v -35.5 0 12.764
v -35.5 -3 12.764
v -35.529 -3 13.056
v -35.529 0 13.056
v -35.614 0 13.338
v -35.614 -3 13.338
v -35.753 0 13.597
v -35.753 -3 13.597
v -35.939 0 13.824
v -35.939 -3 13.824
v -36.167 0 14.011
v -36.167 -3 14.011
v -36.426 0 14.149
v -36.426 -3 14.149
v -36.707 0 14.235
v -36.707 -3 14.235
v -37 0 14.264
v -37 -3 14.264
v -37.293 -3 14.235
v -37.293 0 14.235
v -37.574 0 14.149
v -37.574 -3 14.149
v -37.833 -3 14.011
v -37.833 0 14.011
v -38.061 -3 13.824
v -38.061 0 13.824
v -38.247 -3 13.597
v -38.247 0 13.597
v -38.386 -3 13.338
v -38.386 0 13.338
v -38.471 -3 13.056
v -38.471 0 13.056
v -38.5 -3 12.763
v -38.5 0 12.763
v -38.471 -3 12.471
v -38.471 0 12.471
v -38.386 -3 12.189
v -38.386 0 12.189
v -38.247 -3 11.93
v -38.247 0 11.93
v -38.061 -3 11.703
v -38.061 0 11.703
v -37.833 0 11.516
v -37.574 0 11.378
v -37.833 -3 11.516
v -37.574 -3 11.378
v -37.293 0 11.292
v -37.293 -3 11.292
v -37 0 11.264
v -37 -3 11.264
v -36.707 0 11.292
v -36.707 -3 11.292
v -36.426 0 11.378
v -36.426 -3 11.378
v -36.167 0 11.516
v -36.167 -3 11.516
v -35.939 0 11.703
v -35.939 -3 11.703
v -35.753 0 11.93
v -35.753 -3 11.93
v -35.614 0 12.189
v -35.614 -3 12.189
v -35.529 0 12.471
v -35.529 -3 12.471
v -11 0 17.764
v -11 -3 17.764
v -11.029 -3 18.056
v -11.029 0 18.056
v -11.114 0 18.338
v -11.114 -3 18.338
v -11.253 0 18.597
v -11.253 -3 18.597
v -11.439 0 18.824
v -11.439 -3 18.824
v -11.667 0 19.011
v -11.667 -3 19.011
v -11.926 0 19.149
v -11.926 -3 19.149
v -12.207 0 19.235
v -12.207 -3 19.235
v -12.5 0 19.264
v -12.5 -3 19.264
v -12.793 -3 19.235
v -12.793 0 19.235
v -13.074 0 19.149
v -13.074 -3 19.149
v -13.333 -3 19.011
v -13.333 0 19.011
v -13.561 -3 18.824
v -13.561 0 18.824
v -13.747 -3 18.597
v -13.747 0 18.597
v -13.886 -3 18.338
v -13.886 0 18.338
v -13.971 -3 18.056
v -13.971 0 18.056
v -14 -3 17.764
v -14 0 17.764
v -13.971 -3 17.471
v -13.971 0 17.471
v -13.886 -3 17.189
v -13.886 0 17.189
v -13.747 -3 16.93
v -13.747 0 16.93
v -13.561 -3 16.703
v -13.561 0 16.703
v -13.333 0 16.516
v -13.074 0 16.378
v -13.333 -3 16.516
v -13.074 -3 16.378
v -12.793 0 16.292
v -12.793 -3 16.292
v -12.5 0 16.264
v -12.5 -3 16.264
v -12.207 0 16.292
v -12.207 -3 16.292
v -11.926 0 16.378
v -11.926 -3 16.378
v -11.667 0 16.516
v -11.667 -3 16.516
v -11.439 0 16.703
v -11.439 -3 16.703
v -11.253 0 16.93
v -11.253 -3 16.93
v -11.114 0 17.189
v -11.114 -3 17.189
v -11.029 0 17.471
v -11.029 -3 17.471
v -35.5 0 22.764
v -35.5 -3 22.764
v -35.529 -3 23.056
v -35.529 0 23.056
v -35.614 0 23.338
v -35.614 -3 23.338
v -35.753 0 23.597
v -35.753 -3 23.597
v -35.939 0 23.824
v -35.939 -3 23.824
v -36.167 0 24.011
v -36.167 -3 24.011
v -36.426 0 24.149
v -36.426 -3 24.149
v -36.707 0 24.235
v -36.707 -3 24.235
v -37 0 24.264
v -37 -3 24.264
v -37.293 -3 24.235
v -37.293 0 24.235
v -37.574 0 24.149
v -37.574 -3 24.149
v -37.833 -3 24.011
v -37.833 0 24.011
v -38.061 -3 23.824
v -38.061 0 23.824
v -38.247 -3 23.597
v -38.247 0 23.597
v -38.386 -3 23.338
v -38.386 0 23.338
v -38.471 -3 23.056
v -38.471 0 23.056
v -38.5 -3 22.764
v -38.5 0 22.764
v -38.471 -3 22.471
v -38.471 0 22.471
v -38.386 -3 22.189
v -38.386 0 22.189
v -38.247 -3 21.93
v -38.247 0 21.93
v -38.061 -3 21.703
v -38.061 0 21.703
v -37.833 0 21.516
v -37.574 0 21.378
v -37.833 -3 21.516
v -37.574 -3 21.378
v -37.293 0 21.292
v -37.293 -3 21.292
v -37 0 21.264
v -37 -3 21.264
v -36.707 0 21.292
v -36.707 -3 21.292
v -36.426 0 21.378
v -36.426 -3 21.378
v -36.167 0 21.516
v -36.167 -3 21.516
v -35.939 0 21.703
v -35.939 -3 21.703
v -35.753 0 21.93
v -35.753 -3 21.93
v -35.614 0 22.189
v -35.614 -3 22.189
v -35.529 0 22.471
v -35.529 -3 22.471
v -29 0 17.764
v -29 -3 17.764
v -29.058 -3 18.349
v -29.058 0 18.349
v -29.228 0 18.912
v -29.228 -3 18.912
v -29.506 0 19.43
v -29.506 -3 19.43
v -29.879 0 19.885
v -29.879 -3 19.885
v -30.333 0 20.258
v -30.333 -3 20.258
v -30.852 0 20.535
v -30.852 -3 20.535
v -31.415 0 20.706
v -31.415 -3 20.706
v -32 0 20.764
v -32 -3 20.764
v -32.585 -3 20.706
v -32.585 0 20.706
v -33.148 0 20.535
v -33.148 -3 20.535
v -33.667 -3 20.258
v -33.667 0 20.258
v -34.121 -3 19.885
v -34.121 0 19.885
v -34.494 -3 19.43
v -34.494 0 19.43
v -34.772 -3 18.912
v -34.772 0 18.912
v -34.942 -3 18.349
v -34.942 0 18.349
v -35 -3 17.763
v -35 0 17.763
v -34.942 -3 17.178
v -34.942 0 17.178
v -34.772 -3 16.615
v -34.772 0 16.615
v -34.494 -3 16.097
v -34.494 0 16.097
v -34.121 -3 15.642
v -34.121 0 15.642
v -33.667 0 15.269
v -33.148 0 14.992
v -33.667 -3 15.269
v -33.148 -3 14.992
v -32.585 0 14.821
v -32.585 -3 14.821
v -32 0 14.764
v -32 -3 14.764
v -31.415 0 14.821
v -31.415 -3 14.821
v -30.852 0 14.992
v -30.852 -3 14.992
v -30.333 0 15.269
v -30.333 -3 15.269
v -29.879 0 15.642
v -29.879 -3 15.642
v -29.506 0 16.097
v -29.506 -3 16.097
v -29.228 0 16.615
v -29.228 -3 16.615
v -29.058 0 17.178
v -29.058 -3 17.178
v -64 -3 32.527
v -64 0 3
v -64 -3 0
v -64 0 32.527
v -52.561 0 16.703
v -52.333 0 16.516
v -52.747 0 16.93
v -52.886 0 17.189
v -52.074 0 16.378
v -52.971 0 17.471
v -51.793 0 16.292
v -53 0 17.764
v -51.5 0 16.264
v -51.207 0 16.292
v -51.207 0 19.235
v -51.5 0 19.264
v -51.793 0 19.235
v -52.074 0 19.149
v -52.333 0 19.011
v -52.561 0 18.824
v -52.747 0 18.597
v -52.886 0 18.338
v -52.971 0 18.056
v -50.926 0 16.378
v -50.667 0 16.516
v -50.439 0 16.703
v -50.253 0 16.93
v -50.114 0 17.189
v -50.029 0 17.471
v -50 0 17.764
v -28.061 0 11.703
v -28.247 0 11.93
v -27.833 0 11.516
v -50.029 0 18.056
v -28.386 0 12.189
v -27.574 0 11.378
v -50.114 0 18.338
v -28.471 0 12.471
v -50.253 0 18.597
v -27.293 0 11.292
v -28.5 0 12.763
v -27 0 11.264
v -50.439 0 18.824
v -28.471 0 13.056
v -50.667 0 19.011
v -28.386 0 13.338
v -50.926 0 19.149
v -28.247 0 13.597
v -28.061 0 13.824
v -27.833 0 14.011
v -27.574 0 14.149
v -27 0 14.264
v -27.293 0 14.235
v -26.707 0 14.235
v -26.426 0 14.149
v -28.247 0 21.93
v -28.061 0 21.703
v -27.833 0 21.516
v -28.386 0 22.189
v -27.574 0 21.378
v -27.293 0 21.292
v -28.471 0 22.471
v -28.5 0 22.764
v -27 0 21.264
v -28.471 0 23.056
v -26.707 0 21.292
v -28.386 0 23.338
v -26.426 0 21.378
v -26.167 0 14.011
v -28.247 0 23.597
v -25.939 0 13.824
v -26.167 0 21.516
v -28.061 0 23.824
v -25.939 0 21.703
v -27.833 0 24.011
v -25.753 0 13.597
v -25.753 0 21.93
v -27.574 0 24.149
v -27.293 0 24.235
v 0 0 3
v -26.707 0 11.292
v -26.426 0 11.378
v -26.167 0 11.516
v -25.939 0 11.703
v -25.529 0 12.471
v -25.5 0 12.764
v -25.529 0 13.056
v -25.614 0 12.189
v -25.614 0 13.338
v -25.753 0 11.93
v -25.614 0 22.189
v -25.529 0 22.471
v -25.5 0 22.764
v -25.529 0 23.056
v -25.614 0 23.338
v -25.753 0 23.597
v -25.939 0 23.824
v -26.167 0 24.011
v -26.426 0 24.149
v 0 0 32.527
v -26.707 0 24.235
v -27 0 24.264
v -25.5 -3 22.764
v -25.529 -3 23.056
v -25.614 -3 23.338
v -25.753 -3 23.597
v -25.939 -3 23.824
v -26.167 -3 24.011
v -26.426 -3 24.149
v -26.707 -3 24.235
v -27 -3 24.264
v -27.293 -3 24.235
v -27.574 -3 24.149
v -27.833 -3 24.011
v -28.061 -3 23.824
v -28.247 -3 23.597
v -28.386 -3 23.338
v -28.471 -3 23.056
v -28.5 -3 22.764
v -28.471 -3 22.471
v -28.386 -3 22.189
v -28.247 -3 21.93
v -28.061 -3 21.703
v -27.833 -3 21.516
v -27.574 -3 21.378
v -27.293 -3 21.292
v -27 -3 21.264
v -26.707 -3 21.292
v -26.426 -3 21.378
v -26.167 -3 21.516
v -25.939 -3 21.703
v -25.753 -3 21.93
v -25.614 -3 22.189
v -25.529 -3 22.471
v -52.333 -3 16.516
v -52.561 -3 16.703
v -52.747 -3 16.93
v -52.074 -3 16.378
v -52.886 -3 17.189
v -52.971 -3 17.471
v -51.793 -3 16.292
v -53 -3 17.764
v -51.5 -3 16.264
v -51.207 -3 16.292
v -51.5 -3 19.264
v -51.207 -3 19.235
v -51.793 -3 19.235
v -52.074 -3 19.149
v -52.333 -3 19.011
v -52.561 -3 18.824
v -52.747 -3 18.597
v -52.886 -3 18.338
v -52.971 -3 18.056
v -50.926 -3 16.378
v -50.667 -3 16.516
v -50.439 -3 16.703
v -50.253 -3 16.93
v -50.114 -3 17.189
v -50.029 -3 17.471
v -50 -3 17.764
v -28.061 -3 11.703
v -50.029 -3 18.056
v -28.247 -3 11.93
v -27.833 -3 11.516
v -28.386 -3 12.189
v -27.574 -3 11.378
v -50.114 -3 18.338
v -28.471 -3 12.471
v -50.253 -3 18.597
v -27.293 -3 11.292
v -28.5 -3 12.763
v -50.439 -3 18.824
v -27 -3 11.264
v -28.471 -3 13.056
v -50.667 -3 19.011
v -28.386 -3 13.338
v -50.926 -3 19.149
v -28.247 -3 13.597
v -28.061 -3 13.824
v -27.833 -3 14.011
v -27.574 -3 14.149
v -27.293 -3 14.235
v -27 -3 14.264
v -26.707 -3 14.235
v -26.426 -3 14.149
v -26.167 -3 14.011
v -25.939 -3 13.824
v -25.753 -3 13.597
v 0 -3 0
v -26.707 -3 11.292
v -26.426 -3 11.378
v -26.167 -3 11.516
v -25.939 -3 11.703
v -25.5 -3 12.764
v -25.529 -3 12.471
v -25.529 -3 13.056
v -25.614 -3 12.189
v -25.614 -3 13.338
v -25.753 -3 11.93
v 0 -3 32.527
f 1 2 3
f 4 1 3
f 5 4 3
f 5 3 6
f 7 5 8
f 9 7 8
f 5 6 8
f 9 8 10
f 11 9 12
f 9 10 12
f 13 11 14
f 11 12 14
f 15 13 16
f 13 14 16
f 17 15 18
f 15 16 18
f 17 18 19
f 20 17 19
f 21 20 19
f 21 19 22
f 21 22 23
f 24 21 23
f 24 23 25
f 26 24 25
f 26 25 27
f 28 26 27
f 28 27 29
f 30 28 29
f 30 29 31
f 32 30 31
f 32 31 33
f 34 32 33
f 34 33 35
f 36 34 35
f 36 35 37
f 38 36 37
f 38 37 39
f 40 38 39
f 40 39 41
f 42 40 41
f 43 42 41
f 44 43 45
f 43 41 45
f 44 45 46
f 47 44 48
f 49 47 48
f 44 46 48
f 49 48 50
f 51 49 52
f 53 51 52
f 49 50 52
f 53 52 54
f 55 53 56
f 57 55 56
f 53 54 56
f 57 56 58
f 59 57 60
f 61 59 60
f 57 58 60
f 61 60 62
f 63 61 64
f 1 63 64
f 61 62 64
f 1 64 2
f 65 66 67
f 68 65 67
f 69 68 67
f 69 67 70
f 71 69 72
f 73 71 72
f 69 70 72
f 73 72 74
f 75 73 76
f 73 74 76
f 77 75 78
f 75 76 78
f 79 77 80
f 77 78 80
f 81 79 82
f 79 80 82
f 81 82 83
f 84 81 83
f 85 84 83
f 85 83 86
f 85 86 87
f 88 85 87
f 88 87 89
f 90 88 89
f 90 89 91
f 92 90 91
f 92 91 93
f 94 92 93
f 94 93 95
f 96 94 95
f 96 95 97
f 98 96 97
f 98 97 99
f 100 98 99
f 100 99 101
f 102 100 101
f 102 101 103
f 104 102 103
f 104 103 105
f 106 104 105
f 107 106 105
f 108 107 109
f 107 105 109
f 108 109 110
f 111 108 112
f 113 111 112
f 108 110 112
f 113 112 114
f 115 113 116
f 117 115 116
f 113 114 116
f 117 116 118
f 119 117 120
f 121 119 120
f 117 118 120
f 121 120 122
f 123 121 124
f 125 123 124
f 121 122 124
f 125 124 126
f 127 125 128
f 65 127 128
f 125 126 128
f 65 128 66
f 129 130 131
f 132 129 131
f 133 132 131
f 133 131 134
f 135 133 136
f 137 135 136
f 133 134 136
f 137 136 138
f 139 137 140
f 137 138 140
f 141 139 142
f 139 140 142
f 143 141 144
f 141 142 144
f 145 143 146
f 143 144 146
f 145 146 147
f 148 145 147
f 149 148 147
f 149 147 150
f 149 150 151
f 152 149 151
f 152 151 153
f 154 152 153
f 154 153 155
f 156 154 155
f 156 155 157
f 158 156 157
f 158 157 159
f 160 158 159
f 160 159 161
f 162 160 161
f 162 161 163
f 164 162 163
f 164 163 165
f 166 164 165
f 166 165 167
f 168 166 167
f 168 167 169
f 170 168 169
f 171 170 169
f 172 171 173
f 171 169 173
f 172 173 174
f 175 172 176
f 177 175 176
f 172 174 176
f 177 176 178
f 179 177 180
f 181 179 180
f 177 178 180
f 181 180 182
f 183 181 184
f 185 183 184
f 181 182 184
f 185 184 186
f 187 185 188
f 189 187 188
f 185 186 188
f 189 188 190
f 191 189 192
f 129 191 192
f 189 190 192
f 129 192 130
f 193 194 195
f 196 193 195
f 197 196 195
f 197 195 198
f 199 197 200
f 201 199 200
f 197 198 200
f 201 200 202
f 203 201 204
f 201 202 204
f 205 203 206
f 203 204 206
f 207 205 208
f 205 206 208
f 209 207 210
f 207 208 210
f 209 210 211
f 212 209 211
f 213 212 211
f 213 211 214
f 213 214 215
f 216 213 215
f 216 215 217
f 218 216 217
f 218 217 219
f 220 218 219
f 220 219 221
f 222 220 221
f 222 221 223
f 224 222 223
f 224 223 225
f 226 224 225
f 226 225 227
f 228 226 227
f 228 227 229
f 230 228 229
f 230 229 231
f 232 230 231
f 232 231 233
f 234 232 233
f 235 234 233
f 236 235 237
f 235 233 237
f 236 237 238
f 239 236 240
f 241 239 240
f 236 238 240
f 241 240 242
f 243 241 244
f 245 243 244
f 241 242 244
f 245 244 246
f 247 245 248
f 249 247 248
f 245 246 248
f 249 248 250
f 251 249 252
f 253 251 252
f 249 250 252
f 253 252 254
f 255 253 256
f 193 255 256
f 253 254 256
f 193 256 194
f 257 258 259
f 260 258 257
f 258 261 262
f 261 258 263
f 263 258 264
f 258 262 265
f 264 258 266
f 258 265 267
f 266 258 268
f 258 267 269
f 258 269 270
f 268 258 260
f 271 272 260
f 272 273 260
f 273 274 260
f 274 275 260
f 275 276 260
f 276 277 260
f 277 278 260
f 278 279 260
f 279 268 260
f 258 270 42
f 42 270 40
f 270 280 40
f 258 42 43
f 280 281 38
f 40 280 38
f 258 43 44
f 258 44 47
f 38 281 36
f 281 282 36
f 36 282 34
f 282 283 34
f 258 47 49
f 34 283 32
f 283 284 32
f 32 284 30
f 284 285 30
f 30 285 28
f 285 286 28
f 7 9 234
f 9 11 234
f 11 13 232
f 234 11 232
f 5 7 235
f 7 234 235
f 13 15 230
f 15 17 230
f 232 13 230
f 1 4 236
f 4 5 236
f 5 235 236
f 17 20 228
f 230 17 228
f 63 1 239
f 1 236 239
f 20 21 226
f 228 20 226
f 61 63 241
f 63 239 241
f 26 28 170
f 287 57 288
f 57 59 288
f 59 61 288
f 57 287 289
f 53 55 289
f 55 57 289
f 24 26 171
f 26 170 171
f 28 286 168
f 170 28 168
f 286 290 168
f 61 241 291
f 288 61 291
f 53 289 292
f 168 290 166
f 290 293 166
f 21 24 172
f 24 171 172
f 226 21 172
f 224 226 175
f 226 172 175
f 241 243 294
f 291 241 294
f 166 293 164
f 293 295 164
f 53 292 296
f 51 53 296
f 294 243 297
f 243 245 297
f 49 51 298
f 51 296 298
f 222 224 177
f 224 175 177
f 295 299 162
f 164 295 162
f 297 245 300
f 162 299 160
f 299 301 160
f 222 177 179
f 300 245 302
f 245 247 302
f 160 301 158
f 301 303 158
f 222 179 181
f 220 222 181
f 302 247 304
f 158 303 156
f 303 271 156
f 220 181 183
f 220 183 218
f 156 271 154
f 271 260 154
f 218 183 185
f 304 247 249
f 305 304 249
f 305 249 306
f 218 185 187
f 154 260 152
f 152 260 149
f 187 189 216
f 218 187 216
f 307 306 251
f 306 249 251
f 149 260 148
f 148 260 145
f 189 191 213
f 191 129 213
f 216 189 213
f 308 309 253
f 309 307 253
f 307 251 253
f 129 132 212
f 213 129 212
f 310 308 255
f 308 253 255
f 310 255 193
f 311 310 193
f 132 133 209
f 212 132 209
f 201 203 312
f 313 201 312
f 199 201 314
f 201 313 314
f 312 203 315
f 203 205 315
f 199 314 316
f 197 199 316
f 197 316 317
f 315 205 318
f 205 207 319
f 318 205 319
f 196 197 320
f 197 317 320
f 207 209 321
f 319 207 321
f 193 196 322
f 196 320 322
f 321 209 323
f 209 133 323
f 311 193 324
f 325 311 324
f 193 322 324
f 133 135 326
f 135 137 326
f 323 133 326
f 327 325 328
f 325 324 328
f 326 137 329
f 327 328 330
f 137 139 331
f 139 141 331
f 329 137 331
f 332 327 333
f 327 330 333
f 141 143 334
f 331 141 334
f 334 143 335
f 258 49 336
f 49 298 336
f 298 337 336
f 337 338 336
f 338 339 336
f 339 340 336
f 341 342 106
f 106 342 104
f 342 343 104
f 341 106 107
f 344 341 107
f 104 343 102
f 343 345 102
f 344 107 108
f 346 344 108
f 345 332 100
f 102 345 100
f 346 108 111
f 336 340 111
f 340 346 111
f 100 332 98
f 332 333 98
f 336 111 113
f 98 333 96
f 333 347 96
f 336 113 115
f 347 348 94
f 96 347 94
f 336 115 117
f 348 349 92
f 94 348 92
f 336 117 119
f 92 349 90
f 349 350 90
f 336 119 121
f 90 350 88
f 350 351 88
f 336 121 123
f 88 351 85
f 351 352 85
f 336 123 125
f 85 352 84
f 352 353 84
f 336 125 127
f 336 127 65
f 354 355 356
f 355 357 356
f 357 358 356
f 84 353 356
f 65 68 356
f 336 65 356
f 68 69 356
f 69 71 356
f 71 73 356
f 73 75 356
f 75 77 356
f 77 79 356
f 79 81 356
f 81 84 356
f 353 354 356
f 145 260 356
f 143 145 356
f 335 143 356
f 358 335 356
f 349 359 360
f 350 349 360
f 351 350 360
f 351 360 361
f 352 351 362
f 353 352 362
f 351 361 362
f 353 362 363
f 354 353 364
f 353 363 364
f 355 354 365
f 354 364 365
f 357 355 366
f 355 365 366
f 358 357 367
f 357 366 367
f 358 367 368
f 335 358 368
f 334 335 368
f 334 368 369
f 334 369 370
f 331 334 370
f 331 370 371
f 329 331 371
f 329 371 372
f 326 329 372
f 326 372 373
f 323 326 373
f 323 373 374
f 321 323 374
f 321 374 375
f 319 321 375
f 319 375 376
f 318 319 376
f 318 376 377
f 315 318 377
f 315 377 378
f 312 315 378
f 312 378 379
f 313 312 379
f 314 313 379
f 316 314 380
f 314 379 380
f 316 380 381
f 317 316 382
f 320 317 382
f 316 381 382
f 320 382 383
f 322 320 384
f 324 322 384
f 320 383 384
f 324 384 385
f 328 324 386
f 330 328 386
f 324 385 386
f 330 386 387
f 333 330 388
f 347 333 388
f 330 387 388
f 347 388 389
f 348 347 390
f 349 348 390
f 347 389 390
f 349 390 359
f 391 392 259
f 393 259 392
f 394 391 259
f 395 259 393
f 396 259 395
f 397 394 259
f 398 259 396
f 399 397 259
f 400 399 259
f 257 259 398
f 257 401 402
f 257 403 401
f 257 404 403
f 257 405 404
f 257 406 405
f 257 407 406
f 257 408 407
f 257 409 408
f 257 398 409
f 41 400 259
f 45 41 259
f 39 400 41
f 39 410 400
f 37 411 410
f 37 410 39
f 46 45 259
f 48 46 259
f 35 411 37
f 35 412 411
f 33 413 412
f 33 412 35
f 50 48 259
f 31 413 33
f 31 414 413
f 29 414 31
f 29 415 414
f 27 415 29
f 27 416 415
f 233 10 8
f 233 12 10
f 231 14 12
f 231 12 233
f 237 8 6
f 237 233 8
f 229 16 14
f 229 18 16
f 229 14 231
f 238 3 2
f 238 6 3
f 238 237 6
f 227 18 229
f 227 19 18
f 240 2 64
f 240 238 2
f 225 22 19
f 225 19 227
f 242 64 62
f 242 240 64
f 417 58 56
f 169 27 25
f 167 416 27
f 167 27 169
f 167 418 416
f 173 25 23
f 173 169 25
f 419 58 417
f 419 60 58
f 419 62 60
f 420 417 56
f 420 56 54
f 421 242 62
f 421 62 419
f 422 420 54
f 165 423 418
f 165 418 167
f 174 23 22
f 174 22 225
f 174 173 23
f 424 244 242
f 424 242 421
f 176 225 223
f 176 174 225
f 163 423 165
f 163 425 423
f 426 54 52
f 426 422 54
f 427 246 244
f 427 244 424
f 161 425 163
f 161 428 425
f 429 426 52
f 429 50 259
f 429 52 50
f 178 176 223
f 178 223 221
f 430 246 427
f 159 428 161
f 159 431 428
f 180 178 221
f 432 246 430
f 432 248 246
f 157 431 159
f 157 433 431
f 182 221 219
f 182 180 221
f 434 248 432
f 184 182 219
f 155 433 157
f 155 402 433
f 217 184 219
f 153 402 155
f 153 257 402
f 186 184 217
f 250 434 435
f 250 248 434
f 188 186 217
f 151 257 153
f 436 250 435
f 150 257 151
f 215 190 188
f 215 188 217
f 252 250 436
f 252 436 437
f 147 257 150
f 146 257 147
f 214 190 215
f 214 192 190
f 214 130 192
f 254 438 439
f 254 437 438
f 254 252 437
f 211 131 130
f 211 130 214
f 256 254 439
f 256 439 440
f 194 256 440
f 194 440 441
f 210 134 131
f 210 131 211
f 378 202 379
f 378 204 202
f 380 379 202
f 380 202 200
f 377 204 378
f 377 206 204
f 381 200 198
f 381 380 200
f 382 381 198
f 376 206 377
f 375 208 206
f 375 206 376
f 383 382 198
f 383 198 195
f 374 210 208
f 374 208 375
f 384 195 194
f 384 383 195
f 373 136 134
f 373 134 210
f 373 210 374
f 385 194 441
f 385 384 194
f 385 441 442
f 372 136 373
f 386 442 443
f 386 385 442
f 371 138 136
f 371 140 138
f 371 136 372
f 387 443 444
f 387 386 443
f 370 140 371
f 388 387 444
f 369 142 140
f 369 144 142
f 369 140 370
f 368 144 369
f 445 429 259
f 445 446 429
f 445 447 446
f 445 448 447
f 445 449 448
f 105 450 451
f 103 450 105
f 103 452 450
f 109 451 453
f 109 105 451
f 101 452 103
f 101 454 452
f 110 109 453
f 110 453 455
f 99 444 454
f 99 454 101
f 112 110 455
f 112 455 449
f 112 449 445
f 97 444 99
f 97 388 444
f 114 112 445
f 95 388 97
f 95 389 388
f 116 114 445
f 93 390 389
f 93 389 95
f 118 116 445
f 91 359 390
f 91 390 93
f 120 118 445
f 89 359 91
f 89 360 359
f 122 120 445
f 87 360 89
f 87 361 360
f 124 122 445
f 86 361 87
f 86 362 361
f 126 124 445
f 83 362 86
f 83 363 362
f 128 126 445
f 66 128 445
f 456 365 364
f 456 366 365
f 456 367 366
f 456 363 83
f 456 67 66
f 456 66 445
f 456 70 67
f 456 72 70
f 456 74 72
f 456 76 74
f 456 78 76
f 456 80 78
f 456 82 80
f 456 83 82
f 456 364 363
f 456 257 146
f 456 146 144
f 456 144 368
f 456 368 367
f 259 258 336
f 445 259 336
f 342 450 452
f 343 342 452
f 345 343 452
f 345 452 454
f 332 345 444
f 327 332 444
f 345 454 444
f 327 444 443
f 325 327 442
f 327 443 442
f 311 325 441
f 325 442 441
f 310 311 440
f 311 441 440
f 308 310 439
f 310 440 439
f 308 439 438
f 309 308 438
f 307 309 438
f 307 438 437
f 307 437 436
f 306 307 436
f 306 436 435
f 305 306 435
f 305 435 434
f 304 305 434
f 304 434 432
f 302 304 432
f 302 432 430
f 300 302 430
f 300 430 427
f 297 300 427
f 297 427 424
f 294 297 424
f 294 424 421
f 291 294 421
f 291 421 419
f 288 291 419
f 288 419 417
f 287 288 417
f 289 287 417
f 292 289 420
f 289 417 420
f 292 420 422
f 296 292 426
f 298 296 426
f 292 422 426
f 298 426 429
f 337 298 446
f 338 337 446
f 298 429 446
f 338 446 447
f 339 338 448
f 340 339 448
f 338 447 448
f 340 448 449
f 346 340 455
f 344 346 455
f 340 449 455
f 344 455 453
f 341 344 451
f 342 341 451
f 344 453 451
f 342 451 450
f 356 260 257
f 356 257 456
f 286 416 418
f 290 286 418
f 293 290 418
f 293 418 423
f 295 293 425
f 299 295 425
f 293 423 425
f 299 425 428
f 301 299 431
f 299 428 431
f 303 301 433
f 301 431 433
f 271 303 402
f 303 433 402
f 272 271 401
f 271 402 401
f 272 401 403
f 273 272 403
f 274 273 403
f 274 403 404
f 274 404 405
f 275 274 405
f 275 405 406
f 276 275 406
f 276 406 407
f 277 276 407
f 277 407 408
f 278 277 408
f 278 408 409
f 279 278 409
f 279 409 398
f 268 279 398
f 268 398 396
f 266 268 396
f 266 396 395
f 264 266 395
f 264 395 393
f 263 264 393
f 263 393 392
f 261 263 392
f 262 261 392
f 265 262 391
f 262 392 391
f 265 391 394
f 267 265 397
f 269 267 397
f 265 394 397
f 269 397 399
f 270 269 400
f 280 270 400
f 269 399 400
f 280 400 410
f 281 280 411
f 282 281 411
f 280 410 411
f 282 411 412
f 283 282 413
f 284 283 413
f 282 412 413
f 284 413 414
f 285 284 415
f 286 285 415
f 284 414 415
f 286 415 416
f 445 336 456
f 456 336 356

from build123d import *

# Parameters (mm, degrees)
F0_W     = 64
F0_H     = 32.527
F1_DEPTH = 3
F2_SIZE  = 2.99999
F6_D     = 6
F7_D     = 3


# Not quite as in the source:
# - a fillet or chamfer is up to 0.001 mm smaller than in the source, because OpenCascade refuses the exact size


with BuildPart() as f1:
    # F0 (on Front) → F1 (new body)
    with BuildSketch(Plane.XZ):
        with Locations((-32, 16.2635)):
            Rectangle(F0_W, F0_H)
    extrude(amount=F1_DEPTH)

    # F2 (size 3 in the source; OpenCascade refuses exactly that, so slightly less here)
    f2_edges = [f1.edges().sort_by_distance(p)[0] for p in [
        (-32, 0, 0),
    ]]
    chamfer(f2_edges, length=F2_SIZE)

    # F6 (through all)
    with Locations(Plane(origin=(0, 0, 0), x_dir=(-1, 0, 0), z_dir=(0, 1, 0))):
        with Locations((32, 17.7635)):
            Hole(F6_D / 2)

    # F7 (through all)
    with Locations(Plane(origin=(0, 0, 0), x_dir=(-1, 0, 0), z_dir=(0, 1, 0))):
        with Locations((37, 22.7635), (27, 22.7635), (27, 12.7635), (37, 12.7635), (12.5, 17.7635), (51.5, 17.7635)):
            Hole(F7_D / 2)


solid = f1.part
